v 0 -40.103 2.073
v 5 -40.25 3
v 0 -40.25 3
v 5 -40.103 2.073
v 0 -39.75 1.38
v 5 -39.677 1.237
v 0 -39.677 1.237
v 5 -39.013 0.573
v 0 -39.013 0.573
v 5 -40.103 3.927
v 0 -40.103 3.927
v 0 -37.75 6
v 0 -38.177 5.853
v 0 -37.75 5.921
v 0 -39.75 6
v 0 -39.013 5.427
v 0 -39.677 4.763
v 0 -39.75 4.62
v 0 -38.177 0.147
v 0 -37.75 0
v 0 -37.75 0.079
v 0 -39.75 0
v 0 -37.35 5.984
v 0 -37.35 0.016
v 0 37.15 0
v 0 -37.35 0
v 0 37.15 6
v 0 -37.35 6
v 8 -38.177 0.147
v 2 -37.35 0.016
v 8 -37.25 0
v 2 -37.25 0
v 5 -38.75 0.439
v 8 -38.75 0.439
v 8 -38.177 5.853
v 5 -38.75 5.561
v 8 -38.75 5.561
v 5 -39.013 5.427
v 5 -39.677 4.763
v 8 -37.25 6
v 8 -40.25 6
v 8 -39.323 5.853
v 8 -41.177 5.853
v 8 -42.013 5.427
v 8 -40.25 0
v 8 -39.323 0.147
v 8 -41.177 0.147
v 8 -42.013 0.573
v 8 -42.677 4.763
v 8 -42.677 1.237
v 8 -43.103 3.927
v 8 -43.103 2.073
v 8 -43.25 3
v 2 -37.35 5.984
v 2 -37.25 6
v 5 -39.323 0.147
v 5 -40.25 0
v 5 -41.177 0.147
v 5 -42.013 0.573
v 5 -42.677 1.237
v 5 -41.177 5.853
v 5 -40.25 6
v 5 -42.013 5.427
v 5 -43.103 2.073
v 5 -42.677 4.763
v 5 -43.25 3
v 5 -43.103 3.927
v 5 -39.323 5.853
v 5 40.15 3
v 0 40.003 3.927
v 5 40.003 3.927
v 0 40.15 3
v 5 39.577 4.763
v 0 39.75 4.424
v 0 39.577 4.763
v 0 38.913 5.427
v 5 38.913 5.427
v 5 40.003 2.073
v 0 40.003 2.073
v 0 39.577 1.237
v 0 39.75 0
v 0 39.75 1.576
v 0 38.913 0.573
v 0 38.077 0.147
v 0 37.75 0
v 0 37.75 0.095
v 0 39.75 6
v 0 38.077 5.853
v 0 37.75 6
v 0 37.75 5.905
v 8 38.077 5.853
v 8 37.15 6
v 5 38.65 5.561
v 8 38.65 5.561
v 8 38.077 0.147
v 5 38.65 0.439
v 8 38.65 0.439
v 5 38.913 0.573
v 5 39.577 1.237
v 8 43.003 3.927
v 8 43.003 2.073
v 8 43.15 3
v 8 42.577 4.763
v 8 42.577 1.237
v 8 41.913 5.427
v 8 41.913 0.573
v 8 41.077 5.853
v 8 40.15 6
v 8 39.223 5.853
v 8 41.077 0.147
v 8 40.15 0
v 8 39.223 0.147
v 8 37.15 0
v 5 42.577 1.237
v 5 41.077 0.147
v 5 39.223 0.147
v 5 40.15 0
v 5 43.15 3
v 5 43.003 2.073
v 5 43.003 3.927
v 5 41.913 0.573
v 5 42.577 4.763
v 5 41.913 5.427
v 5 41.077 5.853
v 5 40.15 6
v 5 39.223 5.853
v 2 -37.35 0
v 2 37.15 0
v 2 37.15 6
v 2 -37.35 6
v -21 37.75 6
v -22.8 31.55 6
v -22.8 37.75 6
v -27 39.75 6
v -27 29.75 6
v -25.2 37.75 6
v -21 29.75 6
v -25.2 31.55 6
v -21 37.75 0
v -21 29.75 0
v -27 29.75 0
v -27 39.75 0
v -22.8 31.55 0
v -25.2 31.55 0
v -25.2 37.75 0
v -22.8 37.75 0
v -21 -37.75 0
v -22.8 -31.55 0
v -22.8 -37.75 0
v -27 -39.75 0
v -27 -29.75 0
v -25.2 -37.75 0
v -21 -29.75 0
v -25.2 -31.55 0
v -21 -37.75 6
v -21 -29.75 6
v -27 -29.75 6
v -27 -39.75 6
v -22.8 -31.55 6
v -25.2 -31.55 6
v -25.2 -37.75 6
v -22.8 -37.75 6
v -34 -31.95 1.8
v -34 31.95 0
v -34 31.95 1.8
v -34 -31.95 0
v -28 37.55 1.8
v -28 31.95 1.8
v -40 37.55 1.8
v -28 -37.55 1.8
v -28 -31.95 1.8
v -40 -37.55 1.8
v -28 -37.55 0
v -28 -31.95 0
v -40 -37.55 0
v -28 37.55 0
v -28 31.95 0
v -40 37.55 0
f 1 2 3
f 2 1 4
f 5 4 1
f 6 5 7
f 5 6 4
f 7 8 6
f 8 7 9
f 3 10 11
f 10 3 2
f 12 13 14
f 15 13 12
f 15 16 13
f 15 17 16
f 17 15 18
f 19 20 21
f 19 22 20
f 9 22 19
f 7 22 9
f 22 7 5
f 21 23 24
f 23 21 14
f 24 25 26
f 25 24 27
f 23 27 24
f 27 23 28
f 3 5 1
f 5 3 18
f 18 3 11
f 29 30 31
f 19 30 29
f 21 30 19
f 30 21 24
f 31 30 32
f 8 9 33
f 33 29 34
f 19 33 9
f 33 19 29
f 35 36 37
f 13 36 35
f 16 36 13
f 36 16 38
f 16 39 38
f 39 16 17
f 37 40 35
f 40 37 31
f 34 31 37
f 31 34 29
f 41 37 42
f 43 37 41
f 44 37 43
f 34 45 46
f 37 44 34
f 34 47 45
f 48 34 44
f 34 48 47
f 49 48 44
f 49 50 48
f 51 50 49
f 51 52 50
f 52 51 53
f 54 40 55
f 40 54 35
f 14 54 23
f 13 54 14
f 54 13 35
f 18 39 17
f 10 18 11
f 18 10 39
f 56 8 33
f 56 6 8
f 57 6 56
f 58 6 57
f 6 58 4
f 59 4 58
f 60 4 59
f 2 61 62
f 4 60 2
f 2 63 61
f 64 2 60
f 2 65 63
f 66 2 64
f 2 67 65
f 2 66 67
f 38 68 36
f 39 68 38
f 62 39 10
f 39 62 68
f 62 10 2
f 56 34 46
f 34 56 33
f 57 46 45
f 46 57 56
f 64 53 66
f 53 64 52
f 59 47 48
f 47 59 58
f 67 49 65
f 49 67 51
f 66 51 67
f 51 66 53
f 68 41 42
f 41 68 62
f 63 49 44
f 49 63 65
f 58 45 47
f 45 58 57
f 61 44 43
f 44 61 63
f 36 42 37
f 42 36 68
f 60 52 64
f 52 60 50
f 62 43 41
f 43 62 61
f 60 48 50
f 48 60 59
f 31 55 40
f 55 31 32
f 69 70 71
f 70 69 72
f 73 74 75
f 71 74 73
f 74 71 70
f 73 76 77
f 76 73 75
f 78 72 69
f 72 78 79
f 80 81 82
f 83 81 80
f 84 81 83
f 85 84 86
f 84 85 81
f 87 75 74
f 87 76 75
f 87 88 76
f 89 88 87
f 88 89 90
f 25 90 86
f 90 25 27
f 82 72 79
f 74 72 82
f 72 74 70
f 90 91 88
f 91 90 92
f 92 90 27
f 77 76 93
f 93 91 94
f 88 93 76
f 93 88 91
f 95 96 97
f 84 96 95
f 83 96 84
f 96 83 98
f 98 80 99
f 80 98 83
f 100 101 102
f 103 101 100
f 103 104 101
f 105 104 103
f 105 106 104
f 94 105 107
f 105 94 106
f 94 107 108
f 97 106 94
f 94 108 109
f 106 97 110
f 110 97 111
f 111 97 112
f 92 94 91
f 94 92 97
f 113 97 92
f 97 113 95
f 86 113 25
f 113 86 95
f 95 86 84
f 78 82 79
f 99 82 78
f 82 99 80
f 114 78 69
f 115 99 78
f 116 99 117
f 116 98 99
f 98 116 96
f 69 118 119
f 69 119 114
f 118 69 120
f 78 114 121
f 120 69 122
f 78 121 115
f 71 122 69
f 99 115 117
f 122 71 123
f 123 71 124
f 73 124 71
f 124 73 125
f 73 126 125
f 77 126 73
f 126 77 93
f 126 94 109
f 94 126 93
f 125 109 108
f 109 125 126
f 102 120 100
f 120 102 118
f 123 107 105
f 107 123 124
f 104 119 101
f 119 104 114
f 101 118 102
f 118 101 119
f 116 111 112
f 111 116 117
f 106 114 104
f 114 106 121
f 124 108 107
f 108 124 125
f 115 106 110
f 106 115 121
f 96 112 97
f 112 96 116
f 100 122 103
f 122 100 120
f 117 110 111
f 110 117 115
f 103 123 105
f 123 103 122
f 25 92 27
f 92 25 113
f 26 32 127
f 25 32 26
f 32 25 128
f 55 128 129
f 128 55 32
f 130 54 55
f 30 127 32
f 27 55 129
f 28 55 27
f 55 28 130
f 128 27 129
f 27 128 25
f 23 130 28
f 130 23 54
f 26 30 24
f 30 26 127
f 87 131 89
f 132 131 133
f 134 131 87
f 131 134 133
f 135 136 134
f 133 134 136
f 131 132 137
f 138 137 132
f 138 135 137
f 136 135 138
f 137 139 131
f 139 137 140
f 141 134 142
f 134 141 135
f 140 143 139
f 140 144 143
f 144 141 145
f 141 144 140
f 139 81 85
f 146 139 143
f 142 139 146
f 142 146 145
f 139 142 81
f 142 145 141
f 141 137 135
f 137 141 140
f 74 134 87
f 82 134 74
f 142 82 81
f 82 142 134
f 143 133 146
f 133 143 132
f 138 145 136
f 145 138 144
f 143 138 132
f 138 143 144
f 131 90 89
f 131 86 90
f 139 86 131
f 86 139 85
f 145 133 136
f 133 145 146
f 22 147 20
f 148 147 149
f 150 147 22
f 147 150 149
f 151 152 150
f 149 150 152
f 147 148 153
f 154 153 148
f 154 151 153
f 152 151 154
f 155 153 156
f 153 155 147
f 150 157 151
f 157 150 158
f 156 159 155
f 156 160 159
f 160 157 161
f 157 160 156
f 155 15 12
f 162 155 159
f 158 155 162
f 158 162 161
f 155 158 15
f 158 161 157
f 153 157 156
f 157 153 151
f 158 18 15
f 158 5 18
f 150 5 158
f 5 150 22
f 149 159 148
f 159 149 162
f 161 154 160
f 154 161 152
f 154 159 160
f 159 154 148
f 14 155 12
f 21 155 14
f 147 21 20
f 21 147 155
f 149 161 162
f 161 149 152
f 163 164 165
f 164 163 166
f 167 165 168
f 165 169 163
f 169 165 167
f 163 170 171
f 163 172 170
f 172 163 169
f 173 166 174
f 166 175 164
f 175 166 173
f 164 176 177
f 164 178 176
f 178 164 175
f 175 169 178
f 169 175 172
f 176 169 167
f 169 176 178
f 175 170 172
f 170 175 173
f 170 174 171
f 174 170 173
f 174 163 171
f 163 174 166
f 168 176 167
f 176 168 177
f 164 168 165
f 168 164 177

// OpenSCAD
peg_h = 8;
peg_d = 6;
peg_bump_w = 3;
peg_bump_h = 3;
peg_r = peg_d / 2;
peg_spacing = 74.5;
clip_t = 2;
bar_w = 75.5;
bar_t = 19;
latch_t = 2;
latch_w = 8;
tol = 0.2;
$fn = 20;

module peg() {
    difference() {
        union() {
            cylinder(h = peg_h, r = peg_r);
            translate([0, -peg_bump_w, peg_h - peg_bump_h])
            cylinder(r=peg_r, h=peg_bump_h);
        }
        translate([-peg_r, 0, -1])
        cube([peg_d, peg_r, peg_h + 2]);
     }
}

module bar_latch() {
    translate([-peg_r, -clip_t / 2, -bar_t - clip_t * 4]){
    cube([peg_d, clip_t, bar_t + clip_t * 4]);
    difference() {
        cube([peg_d, latch_w + clip_t,  clip_t * 3]);
        translate([-1, latch_w - peg_d - tol, clip_t - tol])
        cube([peg_d + 2, peg_d + tol * 2, clip_t + tol * 2]);
    }
    }
}

module latch_clip() {
    translate([0, tol, 0]){
    cube([peg_d, bar_w - tol * 2, clip_t - tol]);
    cube([peg_d * 2, peg_d - tol * 2, clip_t - tol]);
    translate([0, bar_w - peg_d, 0])
    cube([peg_d * 2, peg_d - tol * 2, clip_t - tol]);
    }
}
translate([0, 0, peg_r])
rotate([0, 90, 0]) {
translate([0, -peg_spacing / 2, 0]){
translate([-peg_r, -0.1, 0])
cube([peg_d, peg_spacing, clip_t]);
peg();
translate([0, peg_spacing - 0.1, 0])
rotate([0, 0, 180])
peg();
}
    translate([0, bar_w / 2 + clip_t / 2, 0])
rotate([0, 0, 180])
    bar_latch();
translate([0, -(bar_w / 2 + clip_t / 2), 0])
    
    bar_latch();
}

translate([-bar_t * 2 - clip_t, -bar_w / 2, 0])
latch_clip();
